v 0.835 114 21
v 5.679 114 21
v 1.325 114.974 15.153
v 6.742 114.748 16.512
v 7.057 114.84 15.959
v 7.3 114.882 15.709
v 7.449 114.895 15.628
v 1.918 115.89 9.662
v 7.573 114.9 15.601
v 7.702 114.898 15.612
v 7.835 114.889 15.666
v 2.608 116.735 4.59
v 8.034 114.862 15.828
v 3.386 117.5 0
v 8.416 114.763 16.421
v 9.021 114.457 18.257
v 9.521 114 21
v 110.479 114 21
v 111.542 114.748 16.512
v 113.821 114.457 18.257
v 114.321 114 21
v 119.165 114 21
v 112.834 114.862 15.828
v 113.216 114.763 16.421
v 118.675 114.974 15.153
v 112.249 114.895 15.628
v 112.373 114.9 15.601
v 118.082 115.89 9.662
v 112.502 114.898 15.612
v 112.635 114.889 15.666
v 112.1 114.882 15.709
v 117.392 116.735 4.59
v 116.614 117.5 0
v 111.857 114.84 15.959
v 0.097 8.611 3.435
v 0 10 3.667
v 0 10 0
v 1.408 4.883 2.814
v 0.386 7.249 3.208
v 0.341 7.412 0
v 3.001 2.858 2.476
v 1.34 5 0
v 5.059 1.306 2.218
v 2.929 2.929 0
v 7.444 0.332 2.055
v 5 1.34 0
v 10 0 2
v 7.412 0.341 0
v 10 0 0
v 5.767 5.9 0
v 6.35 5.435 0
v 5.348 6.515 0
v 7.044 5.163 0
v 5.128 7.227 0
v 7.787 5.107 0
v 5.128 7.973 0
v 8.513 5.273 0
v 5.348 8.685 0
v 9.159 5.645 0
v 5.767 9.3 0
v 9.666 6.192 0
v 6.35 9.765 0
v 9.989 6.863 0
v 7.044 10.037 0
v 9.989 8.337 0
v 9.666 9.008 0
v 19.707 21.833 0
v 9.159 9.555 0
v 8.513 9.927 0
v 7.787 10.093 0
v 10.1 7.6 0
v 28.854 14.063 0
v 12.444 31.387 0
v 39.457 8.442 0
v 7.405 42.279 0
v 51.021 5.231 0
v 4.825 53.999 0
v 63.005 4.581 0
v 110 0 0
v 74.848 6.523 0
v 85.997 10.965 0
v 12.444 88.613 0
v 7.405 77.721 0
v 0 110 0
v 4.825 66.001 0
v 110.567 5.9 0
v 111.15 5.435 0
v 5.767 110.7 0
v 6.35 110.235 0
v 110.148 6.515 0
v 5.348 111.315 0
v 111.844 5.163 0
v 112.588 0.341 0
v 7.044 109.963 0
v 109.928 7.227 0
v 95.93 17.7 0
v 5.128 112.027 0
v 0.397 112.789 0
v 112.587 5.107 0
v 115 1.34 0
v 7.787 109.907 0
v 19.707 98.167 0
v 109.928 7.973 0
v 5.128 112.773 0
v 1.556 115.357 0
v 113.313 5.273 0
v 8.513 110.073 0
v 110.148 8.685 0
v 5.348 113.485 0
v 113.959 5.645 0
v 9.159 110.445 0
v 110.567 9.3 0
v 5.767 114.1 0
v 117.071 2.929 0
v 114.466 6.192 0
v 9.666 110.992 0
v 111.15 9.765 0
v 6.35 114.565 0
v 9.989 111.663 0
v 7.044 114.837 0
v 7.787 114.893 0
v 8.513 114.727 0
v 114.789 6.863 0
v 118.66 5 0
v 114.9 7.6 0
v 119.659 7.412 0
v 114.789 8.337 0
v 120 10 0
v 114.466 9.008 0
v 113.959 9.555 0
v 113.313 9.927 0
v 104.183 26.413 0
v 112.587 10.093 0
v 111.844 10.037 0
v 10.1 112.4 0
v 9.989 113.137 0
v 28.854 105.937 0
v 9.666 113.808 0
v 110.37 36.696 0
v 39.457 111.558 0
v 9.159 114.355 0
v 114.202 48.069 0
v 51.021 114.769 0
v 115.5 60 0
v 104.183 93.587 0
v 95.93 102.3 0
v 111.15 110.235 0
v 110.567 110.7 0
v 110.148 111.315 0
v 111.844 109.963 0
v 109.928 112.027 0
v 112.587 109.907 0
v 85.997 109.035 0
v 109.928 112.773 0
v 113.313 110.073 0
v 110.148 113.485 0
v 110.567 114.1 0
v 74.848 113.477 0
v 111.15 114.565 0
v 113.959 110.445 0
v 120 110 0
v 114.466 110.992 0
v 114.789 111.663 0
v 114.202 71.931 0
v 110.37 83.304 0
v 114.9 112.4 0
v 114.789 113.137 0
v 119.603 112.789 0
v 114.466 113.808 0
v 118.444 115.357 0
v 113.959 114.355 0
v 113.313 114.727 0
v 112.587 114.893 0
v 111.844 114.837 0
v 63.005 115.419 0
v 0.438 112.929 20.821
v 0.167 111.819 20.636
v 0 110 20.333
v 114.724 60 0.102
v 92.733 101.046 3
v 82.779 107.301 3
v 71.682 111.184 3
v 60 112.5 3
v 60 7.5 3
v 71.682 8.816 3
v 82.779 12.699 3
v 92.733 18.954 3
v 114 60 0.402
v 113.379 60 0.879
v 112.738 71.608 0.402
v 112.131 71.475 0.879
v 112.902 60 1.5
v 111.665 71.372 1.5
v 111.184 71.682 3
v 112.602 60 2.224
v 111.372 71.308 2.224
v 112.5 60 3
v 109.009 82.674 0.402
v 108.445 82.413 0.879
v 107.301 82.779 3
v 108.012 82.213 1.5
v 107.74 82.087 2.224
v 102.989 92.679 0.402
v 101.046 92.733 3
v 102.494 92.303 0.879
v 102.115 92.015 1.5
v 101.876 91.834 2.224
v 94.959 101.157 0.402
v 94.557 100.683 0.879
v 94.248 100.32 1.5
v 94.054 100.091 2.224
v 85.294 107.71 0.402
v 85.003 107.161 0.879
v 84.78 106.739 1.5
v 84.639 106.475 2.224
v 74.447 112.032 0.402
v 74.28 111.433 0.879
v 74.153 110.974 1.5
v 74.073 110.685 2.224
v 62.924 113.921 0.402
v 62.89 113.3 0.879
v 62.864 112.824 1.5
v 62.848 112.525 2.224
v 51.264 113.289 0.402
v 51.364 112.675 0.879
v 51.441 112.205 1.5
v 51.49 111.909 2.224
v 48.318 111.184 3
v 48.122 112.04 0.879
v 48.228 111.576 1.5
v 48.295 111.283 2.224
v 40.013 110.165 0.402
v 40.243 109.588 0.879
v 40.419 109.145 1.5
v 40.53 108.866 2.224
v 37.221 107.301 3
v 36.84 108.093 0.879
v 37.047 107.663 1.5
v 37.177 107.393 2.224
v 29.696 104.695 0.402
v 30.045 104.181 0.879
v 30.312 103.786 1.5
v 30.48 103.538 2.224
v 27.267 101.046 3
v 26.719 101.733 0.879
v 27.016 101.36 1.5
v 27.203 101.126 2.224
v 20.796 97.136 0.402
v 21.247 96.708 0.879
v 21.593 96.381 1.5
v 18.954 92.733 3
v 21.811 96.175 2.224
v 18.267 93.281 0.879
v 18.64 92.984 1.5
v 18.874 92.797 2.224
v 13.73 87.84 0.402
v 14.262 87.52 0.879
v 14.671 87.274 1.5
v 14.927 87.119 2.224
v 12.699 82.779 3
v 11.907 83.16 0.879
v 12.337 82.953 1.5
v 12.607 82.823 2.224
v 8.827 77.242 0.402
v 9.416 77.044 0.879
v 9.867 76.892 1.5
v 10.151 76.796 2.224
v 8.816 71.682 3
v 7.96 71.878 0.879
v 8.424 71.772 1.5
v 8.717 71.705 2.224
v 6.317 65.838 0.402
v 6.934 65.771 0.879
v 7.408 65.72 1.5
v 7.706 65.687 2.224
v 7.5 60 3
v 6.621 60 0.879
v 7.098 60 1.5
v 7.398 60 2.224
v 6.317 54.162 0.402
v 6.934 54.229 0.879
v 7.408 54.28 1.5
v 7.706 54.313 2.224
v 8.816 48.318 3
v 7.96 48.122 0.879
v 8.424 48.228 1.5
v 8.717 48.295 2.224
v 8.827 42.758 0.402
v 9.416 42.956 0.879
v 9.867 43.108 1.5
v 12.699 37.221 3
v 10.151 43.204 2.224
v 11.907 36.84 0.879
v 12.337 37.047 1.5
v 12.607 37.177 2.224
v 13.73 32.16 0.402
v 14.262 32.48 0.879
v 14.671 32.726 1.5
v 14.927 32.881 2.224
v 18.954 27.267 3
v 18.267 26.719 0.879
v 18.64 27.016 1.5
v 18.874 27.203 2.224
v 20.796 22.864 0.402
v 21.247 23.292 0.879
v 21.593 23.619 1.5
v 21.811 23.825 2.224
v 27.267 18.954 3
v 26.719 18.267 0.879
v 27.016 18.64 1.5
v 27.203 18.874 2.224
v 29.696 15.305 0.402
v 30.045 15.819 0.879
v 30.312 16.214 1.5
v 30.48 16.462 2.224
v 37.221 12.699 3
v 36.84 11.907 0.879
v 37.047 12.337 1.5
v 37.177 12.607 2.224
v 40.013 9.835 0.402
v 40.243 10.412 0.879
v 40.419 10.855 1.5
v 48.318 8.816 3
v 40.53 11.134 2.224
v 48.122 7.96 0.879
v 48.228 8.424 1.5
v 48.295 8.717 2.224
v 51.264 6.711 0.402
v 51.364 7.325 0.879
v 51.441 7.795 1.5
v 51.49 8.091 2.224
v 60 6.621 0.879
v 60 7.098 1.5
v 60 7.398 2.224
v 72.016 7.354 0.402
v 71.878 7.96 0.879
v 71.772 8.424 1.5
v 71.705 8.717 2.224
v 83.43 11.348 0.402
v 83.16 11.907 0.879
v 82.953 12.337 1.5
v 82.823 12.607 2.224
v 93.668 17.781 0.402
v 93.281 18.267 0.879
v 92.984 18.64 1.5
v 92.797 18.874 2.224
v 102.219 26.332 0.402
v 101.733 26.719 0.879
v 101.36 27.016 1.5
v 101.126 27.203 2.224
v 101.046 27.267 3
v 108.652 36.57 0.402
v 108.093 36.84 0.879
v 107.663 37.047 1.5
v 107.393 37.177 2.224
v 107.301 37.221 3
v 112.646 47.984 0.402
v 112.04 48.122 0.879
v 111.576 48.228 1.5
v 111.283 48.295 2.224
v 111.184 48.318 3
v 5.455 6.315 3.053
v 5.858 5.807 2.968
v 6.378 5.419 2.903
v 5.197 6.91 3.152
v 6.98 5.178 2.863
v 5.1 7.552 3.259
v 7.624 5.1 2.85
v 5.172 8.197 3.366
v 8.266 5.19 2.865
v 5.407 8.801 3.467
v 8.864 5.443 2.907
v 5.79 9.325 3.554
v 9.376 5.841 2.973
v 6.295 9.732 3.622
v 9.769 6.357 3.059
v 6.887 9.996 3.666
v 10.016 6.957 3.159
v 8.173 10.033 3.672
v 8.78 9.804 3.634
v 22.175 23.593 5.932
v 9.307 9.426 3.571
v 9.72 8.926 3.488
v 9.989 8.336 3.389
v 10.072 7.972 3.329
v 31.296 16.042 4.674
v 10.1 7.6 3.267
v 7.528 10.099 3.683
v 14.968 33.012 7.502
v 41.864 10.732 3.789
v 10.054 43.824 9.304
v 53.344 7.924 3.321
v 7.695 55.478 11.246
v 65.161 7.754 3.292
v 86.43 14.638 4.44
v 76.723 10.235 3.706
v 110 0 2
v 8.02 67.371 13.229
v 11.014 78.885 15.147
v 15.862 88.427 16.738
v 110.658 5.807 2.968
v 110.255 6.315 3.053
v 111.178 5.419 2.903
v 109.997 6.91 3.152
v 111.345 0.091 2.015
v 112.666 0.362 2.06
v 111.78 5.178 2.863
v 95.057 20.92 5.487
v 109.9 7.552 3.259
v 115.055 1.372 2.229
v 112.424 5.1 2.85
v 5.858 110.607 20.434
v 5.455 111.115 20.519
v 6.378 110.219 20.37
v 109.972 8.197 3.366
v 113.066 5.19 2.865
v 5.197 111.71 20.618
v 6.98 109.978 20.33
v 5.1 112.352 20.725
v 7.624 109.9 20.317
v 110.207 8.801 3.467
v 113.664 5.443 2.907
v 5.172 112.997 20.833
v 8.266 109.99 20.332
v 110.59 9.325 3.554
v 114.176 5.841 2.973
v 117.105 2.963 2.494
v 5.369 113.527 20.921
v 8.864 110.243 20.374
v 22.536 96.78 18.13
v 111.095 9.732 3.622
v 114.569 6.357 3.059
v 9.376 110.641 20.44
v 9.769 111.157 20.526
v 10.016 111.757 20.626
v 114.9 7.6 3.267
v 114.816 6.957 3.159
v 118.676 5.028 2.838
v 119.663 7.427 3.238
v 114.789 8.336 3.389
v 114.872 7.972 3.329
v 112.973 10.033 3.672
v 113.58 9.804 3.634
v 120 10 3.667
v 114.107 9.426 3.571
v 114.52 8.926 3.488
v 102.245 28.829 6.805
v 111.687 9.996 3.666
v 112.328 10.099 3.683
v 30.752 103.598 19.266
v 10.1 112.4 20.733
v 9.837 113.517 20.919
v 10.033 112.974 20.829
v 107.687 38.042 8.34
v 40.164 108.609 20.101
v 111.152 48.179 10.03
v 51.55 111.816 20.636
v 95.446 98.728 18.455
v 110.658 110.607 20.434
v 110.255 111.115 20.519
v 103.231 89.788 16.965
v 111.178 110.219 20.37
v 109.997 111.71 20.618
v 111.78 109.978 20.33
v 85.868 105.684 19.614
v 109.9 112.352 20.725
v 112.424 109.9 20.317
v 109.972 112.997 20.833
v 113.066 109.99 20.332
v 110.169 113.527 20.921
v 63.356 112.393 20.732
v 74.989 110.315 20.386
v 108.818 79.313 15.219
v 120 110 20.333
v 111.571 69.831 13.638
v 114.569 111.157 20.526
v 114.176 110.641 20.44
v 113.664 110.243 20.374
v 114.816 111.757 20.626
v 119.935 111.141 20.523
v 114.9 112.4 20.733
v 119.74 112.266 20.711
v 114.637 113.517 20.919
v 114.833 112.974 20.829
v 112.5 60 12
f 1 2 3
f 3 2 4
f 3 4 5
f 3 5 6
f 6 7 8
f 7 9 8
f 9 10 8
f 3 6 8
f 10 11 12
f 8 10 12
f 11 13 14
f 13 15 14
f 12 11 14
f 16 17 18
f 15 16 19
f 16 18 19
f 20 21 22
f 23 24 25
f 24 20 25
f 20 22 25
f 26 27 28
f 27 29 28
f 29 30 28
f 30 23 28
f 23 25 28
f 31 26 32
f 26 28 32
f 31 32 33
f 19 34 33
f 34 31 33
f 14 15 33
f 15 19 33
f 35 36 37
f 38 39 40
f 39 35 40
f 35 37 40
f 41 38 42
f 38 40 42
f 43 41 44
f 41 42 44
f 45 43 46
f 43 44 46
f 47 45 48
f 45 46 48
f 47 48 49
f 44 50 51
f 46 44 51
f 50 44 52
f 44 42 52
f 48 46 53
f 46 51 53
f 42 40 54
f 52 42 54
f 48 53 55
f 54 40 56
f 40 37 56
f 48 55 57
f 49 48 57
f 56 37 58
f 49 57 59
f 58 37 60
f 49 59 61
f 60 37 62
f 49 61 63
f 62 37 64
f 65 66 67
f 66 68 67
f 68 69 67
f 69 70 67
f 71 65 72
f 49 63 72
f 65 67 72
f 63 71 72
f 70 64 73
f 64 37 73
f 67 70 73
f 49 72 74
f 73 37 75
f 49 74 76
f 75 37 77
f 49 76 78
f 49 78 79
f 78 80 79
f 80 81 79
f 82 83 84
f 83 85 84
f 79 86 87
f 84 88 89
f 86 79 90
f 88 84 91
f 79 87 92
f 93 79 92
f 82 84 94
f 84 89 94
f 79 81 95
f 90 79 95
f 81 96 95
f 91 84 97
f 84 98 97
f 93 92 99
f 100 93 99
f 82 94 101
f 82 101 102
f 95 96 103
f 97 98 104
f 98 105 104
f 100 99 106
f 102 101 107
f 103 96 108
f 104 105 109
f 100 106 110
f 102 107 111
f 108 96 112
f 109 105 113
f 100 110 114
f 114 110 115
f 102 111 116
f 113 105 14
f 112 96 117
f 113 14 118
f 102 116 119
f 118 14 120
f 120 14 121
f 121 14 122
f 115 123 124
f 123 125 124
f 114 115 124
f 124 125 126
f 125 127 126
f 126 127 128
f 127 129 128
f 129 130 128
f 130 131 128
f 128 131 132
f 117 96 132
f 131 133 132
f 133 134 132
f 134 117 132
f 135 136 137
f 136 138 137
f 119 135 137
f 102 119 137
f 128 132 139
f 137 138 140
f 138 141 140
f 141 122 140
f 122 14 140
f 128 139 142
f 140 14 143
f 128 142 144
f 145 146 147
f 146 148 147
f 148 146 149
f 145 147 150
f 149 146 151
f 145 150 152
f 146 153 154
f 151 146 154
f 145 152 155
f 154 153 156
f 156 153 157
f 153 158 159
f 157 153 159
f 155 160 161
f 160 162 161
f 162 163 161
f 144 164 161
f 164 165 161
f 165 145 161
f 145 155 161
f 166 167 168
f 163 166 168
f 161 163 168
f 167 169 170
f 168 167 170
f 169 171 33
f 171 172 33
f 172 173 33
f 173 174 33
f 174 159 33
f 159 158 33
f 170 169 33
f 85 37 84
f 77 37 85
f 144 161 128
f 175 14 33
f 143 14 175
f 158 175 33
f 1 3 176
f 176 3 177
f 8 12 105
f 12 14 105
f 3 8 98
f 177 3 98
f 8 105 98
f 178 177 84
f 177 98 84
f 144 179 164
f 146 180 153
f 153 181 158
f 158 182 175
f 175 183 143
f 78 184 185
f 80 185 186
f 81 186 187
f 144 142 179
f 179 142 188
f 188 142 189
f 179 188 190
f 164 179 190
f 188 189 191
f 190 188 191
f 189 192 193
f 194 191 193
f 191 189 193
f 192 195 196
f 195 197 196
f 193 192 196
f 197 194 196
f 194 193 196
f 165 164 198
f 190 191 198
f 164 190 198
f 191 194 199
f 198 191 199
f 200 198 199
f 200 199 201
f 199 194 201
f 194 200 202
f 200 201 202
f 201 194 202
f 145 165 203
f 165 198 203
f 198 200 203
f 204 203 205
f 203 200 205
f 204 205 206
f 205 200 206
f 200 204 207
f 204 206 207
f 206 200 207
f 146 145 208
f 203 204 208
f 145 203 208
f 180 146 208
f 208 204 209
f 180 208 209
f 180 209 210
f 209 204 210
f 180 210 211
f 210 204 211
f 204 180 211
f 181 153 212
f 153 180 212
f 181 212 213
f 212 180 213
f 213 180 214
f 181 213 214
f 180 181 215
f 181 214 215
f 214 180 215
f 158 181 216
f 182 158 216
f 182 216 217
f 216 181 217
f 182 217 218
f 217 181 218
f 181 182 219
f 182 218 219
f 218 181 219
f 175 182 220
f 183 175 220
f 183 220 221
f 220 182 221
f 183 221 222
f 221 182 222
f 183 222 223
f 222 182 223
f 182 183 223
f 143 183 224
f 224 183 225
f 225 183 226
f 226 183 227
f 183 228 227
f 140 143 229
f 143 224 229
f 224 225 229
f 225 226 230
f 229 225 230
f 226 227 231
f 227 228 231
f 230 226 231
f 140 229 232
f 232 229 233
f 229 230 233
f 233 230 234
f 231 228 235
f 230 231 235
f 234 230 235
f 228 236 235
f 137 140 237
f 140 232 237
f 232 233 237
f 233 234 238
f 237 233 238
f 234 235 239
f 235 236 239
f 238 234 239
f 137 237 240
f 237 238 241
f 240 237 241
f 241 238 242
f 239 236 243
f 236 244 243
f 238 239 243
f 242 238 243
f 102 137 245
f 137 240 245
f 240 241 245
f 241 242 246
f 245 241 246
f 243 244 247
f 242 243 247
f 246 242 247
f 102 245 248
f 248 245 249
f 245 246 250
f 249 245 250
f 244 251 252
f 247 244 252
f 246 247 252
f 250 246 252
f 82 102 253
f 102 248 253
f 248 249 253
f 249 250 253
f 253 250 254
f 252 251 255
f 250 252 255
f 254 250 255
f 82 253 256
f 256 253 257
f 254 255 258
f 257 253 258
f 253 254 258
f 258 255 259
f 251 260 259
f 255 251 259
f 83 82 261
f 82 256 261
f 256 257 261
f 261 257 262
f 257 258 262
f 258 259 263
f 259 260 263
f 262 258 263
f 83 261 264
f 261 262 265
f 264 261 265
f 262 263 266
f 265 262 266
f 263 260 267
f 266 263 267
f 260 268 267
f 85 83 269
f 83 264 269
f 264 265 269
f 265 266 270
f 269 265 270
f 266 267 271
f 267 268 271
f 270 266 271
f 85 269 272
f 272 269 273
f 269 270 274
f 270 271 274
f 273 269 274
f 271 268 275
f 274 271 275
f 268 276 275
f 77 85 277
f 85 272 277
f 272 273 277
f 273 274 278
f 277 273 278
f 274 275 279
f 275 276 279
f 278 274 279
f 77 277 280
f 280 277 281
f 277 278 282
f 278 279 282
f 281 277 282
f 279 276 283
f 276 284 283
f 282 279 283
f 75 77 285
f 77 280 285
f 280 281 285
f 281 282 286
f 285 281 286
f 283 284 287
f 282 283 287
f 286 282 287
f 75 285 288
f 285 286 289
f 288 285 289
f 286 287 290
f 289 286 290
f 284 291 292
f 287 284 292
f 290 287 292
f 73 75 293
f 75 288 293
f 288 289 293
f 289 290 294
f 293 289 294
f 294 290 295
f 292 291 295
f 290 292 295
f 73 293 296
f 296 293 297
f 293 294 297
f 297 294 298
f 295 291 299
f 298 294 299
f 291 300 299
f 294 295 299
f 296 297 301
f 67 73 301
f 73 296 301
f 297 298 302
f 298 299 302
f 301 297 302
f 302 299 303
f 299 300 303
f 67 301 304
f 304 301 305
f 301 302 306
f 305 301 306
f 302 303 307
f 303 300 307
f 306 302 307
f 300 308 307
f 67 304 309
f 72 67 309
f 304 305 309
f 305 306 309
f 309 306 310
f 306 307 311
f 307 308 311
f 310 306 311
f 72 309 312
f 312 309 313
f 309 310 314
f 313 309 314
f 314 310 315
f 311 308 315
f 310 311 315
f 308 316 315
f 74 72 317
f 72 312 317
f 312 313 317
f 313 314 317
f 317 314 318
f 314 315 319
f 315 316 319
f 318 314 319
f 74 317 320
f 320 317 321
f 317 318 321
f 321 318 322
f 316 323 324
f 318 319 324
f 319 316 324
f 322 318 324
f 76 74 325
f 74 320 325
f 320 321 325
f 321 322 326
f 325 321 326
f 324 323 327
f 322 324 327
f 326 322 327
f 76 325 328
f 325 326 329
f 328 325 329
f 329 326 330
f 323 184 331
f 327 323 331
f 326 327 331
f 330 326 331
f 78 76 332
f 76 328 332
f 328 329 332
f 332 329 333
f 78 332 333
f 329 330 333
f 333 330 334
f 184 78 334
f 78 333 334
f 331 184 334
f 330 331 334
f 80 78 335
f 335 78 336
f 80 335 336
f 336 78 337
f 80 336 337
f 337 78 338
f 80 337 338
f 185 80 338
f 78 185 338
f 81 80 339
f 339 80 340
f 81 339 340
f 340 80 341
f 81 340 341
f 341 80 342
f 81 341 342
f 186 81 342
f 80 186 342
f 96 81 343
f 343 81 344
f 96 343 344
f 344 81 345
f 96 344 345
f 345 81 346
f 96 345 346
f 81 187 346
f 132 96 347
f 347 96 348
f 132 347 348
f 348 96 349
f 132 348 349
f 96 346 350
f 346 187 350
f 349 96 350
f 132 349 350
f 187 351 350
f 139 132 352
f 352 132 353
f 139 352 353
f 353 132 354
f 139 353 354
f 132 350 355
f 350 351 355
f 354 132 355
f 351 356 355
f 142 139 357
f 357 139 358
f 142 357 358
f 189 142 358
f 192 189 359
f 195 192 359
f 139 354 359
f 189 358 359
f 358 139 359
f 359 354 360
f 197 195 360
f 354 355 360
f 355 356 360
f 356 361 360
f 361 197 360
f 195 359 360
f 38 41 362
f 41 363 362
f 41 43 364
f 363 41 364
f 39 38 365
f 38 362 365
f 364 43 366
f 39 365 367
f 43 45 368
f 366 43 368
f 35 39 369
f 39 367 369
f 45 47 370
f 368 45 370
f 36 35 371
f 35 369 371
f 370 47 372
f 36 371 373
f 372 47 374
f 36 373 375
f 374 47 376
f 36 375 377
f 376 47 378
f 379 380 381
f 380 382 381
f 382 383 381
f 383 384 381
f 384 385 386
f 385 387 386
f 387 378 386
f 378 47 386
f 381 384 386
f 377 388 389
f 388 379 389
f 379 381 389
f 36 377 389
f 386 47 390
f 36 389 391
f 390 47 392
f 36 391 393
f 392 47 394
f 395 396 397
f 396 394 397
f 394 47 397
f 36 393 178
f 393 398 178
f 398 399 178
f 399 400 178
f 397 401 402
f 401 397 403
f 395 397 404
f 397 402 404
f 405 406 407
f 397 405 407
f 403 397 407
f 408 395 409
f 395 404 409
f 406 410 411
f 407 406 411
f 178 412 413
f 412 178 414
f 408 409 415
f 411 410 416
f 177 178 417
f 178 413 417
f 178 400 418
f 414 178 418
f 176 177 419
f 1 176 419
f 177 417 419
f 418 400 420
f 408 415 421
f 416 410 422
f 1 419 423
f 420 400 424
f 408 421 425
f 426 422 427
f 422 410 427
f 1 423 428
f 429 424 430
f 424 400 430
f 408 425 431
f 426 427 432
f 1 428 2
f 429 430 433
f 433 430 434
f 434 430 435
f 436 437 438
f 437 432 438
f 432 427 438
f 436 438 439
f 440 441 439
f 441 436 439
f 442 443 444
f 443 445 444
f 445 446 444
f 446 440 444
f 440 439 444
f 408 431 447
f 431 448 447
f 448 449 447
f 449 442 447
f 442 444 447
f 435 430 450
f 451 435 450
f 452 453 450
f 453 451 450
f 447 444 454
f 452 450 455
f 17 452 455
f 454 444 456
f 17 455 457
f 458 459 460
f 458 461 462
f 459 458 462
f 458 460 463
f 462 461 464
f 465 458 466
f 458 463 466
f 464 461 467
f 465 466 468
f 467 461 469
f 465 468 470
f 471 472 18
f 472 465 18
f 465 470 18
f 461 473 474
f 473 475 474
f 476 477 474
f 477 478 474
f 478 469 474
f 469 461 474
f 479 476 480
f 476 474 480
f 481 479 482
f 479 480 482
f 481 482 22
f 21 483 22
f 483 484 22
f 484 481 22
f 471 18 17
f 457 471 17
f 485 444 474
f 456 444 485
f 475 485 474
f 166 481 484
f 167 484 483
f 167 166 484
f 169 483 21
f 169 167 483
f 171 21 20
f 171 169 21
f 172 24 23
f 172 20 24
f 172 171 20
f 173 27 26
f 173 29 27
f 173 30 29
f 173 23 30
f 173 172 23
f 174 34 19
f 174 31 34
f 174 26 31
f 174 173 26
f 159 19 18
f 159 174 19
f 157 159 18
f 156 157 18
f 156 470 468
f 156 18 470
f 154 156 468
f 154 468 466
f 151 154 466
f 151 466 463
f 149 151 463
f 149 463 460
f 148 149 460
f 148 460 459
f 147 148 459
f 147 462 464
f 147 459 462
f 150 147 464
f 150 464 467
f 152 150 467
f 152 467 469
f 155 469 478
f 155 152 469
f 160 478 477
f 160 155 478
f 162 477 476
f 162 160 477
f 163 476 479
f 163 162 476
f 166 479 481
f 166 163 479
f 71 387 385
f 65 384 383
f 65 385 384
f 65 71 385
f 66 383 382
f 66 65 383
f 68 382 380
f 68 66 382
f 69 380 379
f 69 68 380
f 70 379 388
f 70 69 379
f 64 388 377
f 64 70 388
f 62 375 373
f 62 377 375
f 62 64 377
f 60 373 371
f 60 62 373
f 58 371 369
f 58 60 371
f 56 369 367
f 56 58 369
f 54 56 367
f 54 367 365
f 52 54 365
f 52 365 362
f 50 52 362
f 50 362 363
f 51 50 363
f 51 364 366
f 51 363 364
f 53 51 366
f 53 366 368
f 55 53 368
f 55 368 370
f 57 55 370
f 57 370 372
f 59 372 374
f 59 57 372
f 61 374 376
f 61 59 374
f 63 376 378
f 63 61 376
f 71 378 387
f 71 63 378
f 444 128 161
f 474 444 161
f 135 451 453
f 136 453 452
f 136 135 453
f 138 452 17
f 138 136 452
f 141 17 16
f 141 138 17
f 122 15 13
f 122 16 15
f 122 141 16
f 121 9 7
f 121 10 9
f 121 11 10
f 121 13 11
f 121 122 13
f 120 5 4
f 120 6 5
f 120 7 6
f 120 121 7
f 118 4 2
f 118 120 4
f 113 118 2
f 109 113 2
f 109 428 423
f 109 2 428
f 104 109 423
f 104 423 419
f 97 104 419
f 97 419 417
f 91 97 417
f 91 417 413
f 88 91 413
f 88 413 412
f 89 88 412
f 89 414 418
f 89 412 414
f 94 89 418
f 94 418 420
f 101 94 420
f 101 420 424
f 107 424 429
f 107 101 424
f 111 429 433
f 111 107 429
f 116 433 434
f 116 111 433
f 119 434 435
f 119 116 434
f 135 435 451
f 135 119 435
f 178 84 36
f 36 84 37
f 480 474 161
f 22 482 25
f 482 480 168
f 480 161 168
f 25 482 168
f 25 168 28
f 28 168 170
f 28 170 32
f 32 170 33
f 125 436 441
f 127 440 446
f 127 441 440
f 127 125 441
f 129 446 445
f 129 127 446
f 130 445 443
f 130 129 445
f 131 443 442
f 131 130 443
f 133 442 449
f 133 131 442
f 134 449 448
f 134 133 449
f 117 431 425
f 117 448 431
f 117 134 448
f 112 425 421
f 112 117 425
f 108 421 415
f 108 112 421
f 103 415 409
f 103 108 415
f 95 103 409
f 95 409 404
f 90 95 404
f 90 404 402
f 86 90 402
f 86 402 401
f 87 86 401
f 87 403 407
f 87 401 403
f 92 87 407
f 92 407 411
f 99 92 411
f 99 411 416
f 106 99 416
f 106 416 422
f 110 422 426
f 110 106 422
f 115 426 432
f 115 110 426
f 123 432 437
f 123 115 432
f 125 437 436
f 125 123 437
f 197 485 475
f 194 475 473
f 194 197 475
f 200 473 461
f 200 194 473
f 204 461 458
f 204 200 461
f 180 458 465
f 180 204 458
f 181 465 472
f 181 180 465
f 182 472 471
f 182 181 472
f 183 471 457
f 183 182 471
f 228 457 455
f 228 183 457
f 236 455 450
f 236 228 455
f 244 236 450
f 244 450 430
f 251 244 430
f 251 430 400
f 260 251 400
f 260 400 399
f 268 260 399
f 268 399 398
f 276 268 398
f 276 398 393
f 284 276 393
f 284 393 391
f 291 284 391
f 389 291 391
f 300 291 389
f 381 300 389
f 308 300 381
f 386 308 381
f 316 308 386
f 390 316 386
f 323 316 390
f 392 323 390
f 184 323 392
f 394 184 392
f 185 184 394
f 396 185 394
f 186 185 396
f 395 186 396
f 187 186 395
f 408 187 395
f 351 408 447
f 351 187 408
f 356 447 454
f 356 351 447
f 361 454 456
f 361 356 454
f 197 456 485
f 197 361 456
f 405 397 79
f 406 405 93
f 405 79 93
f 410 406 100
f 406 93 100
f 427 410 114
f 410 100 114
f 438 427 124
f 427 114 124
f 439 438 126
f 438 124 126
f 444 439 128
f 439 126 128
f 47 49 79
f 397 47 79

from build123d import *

# Parameters (mm, degrees)
F0_R     = 2.5
F0_R_2   = 52.5
F1_DEPTH = 30
F3_DEPTH = 120.001
F4_R     = 3


with BuildPart() as f1:
    # F0 (on Top) → F1 (new body)
    with BuildSketch(Plane.XY):
        with BuildLine():
            ThreePointArc((0, 10), (2.928932, 2.928932), (10, 0))
            Line((10, 0), (110, 0))
            ThreePointArc((110, 0), (117.071068, 2.928932), (120, 10))
            Line((120, 10), (120, 110))
            ThreePointArc((120, 110), (117.071068, 117.071068), (110, 120))
            Line((110, 120), (10, 120))
            ThreePointArc((10, 120), (2.928932, 117.071068), (0, 110))
            Line((0, 110), (0, 10))
        make_face()
        with Locations((7.6, 7.6)):
            Circle(F0_R, mode=Mode.SUBTRACT)
        with Locations((112.4, 7.6)):
            Circle(F0_R, mode=Mode.SUBTRACT)
        with Locations((60, 60)):
            Circle(F0_R_2, mode=Mode.SUBTRACT)
        with Locations((7.6, 112.4)):
            Circle(F0_R, mode=Mode.SUBTRACT)
        with Locations((112.4, 112.4)):
            Circle(F0_R, mode=Mode.SUBTRACT)
    extrude(amount=F1_DEPTH)

    # F2 (on face) → F3 (cut, through all)
    with BuildSketch(Plane.YZ.offset(120)):
        Polygon((0, 45), (0, 2), (114, 21), (117.5, 0), (125, 0), (125, 45), (120, 45), align=None)
    extrude(amount=-F3_DEPTH, mode=Mode.SUBTRACT)

    # F4
    f4_edges = [f1.edges().sort_by_distance(p)[0] for p in [
        (7.5, 60, 0),
    ]]
    fillet(f4_edges, radius=F4_R)


solid = f1.part
